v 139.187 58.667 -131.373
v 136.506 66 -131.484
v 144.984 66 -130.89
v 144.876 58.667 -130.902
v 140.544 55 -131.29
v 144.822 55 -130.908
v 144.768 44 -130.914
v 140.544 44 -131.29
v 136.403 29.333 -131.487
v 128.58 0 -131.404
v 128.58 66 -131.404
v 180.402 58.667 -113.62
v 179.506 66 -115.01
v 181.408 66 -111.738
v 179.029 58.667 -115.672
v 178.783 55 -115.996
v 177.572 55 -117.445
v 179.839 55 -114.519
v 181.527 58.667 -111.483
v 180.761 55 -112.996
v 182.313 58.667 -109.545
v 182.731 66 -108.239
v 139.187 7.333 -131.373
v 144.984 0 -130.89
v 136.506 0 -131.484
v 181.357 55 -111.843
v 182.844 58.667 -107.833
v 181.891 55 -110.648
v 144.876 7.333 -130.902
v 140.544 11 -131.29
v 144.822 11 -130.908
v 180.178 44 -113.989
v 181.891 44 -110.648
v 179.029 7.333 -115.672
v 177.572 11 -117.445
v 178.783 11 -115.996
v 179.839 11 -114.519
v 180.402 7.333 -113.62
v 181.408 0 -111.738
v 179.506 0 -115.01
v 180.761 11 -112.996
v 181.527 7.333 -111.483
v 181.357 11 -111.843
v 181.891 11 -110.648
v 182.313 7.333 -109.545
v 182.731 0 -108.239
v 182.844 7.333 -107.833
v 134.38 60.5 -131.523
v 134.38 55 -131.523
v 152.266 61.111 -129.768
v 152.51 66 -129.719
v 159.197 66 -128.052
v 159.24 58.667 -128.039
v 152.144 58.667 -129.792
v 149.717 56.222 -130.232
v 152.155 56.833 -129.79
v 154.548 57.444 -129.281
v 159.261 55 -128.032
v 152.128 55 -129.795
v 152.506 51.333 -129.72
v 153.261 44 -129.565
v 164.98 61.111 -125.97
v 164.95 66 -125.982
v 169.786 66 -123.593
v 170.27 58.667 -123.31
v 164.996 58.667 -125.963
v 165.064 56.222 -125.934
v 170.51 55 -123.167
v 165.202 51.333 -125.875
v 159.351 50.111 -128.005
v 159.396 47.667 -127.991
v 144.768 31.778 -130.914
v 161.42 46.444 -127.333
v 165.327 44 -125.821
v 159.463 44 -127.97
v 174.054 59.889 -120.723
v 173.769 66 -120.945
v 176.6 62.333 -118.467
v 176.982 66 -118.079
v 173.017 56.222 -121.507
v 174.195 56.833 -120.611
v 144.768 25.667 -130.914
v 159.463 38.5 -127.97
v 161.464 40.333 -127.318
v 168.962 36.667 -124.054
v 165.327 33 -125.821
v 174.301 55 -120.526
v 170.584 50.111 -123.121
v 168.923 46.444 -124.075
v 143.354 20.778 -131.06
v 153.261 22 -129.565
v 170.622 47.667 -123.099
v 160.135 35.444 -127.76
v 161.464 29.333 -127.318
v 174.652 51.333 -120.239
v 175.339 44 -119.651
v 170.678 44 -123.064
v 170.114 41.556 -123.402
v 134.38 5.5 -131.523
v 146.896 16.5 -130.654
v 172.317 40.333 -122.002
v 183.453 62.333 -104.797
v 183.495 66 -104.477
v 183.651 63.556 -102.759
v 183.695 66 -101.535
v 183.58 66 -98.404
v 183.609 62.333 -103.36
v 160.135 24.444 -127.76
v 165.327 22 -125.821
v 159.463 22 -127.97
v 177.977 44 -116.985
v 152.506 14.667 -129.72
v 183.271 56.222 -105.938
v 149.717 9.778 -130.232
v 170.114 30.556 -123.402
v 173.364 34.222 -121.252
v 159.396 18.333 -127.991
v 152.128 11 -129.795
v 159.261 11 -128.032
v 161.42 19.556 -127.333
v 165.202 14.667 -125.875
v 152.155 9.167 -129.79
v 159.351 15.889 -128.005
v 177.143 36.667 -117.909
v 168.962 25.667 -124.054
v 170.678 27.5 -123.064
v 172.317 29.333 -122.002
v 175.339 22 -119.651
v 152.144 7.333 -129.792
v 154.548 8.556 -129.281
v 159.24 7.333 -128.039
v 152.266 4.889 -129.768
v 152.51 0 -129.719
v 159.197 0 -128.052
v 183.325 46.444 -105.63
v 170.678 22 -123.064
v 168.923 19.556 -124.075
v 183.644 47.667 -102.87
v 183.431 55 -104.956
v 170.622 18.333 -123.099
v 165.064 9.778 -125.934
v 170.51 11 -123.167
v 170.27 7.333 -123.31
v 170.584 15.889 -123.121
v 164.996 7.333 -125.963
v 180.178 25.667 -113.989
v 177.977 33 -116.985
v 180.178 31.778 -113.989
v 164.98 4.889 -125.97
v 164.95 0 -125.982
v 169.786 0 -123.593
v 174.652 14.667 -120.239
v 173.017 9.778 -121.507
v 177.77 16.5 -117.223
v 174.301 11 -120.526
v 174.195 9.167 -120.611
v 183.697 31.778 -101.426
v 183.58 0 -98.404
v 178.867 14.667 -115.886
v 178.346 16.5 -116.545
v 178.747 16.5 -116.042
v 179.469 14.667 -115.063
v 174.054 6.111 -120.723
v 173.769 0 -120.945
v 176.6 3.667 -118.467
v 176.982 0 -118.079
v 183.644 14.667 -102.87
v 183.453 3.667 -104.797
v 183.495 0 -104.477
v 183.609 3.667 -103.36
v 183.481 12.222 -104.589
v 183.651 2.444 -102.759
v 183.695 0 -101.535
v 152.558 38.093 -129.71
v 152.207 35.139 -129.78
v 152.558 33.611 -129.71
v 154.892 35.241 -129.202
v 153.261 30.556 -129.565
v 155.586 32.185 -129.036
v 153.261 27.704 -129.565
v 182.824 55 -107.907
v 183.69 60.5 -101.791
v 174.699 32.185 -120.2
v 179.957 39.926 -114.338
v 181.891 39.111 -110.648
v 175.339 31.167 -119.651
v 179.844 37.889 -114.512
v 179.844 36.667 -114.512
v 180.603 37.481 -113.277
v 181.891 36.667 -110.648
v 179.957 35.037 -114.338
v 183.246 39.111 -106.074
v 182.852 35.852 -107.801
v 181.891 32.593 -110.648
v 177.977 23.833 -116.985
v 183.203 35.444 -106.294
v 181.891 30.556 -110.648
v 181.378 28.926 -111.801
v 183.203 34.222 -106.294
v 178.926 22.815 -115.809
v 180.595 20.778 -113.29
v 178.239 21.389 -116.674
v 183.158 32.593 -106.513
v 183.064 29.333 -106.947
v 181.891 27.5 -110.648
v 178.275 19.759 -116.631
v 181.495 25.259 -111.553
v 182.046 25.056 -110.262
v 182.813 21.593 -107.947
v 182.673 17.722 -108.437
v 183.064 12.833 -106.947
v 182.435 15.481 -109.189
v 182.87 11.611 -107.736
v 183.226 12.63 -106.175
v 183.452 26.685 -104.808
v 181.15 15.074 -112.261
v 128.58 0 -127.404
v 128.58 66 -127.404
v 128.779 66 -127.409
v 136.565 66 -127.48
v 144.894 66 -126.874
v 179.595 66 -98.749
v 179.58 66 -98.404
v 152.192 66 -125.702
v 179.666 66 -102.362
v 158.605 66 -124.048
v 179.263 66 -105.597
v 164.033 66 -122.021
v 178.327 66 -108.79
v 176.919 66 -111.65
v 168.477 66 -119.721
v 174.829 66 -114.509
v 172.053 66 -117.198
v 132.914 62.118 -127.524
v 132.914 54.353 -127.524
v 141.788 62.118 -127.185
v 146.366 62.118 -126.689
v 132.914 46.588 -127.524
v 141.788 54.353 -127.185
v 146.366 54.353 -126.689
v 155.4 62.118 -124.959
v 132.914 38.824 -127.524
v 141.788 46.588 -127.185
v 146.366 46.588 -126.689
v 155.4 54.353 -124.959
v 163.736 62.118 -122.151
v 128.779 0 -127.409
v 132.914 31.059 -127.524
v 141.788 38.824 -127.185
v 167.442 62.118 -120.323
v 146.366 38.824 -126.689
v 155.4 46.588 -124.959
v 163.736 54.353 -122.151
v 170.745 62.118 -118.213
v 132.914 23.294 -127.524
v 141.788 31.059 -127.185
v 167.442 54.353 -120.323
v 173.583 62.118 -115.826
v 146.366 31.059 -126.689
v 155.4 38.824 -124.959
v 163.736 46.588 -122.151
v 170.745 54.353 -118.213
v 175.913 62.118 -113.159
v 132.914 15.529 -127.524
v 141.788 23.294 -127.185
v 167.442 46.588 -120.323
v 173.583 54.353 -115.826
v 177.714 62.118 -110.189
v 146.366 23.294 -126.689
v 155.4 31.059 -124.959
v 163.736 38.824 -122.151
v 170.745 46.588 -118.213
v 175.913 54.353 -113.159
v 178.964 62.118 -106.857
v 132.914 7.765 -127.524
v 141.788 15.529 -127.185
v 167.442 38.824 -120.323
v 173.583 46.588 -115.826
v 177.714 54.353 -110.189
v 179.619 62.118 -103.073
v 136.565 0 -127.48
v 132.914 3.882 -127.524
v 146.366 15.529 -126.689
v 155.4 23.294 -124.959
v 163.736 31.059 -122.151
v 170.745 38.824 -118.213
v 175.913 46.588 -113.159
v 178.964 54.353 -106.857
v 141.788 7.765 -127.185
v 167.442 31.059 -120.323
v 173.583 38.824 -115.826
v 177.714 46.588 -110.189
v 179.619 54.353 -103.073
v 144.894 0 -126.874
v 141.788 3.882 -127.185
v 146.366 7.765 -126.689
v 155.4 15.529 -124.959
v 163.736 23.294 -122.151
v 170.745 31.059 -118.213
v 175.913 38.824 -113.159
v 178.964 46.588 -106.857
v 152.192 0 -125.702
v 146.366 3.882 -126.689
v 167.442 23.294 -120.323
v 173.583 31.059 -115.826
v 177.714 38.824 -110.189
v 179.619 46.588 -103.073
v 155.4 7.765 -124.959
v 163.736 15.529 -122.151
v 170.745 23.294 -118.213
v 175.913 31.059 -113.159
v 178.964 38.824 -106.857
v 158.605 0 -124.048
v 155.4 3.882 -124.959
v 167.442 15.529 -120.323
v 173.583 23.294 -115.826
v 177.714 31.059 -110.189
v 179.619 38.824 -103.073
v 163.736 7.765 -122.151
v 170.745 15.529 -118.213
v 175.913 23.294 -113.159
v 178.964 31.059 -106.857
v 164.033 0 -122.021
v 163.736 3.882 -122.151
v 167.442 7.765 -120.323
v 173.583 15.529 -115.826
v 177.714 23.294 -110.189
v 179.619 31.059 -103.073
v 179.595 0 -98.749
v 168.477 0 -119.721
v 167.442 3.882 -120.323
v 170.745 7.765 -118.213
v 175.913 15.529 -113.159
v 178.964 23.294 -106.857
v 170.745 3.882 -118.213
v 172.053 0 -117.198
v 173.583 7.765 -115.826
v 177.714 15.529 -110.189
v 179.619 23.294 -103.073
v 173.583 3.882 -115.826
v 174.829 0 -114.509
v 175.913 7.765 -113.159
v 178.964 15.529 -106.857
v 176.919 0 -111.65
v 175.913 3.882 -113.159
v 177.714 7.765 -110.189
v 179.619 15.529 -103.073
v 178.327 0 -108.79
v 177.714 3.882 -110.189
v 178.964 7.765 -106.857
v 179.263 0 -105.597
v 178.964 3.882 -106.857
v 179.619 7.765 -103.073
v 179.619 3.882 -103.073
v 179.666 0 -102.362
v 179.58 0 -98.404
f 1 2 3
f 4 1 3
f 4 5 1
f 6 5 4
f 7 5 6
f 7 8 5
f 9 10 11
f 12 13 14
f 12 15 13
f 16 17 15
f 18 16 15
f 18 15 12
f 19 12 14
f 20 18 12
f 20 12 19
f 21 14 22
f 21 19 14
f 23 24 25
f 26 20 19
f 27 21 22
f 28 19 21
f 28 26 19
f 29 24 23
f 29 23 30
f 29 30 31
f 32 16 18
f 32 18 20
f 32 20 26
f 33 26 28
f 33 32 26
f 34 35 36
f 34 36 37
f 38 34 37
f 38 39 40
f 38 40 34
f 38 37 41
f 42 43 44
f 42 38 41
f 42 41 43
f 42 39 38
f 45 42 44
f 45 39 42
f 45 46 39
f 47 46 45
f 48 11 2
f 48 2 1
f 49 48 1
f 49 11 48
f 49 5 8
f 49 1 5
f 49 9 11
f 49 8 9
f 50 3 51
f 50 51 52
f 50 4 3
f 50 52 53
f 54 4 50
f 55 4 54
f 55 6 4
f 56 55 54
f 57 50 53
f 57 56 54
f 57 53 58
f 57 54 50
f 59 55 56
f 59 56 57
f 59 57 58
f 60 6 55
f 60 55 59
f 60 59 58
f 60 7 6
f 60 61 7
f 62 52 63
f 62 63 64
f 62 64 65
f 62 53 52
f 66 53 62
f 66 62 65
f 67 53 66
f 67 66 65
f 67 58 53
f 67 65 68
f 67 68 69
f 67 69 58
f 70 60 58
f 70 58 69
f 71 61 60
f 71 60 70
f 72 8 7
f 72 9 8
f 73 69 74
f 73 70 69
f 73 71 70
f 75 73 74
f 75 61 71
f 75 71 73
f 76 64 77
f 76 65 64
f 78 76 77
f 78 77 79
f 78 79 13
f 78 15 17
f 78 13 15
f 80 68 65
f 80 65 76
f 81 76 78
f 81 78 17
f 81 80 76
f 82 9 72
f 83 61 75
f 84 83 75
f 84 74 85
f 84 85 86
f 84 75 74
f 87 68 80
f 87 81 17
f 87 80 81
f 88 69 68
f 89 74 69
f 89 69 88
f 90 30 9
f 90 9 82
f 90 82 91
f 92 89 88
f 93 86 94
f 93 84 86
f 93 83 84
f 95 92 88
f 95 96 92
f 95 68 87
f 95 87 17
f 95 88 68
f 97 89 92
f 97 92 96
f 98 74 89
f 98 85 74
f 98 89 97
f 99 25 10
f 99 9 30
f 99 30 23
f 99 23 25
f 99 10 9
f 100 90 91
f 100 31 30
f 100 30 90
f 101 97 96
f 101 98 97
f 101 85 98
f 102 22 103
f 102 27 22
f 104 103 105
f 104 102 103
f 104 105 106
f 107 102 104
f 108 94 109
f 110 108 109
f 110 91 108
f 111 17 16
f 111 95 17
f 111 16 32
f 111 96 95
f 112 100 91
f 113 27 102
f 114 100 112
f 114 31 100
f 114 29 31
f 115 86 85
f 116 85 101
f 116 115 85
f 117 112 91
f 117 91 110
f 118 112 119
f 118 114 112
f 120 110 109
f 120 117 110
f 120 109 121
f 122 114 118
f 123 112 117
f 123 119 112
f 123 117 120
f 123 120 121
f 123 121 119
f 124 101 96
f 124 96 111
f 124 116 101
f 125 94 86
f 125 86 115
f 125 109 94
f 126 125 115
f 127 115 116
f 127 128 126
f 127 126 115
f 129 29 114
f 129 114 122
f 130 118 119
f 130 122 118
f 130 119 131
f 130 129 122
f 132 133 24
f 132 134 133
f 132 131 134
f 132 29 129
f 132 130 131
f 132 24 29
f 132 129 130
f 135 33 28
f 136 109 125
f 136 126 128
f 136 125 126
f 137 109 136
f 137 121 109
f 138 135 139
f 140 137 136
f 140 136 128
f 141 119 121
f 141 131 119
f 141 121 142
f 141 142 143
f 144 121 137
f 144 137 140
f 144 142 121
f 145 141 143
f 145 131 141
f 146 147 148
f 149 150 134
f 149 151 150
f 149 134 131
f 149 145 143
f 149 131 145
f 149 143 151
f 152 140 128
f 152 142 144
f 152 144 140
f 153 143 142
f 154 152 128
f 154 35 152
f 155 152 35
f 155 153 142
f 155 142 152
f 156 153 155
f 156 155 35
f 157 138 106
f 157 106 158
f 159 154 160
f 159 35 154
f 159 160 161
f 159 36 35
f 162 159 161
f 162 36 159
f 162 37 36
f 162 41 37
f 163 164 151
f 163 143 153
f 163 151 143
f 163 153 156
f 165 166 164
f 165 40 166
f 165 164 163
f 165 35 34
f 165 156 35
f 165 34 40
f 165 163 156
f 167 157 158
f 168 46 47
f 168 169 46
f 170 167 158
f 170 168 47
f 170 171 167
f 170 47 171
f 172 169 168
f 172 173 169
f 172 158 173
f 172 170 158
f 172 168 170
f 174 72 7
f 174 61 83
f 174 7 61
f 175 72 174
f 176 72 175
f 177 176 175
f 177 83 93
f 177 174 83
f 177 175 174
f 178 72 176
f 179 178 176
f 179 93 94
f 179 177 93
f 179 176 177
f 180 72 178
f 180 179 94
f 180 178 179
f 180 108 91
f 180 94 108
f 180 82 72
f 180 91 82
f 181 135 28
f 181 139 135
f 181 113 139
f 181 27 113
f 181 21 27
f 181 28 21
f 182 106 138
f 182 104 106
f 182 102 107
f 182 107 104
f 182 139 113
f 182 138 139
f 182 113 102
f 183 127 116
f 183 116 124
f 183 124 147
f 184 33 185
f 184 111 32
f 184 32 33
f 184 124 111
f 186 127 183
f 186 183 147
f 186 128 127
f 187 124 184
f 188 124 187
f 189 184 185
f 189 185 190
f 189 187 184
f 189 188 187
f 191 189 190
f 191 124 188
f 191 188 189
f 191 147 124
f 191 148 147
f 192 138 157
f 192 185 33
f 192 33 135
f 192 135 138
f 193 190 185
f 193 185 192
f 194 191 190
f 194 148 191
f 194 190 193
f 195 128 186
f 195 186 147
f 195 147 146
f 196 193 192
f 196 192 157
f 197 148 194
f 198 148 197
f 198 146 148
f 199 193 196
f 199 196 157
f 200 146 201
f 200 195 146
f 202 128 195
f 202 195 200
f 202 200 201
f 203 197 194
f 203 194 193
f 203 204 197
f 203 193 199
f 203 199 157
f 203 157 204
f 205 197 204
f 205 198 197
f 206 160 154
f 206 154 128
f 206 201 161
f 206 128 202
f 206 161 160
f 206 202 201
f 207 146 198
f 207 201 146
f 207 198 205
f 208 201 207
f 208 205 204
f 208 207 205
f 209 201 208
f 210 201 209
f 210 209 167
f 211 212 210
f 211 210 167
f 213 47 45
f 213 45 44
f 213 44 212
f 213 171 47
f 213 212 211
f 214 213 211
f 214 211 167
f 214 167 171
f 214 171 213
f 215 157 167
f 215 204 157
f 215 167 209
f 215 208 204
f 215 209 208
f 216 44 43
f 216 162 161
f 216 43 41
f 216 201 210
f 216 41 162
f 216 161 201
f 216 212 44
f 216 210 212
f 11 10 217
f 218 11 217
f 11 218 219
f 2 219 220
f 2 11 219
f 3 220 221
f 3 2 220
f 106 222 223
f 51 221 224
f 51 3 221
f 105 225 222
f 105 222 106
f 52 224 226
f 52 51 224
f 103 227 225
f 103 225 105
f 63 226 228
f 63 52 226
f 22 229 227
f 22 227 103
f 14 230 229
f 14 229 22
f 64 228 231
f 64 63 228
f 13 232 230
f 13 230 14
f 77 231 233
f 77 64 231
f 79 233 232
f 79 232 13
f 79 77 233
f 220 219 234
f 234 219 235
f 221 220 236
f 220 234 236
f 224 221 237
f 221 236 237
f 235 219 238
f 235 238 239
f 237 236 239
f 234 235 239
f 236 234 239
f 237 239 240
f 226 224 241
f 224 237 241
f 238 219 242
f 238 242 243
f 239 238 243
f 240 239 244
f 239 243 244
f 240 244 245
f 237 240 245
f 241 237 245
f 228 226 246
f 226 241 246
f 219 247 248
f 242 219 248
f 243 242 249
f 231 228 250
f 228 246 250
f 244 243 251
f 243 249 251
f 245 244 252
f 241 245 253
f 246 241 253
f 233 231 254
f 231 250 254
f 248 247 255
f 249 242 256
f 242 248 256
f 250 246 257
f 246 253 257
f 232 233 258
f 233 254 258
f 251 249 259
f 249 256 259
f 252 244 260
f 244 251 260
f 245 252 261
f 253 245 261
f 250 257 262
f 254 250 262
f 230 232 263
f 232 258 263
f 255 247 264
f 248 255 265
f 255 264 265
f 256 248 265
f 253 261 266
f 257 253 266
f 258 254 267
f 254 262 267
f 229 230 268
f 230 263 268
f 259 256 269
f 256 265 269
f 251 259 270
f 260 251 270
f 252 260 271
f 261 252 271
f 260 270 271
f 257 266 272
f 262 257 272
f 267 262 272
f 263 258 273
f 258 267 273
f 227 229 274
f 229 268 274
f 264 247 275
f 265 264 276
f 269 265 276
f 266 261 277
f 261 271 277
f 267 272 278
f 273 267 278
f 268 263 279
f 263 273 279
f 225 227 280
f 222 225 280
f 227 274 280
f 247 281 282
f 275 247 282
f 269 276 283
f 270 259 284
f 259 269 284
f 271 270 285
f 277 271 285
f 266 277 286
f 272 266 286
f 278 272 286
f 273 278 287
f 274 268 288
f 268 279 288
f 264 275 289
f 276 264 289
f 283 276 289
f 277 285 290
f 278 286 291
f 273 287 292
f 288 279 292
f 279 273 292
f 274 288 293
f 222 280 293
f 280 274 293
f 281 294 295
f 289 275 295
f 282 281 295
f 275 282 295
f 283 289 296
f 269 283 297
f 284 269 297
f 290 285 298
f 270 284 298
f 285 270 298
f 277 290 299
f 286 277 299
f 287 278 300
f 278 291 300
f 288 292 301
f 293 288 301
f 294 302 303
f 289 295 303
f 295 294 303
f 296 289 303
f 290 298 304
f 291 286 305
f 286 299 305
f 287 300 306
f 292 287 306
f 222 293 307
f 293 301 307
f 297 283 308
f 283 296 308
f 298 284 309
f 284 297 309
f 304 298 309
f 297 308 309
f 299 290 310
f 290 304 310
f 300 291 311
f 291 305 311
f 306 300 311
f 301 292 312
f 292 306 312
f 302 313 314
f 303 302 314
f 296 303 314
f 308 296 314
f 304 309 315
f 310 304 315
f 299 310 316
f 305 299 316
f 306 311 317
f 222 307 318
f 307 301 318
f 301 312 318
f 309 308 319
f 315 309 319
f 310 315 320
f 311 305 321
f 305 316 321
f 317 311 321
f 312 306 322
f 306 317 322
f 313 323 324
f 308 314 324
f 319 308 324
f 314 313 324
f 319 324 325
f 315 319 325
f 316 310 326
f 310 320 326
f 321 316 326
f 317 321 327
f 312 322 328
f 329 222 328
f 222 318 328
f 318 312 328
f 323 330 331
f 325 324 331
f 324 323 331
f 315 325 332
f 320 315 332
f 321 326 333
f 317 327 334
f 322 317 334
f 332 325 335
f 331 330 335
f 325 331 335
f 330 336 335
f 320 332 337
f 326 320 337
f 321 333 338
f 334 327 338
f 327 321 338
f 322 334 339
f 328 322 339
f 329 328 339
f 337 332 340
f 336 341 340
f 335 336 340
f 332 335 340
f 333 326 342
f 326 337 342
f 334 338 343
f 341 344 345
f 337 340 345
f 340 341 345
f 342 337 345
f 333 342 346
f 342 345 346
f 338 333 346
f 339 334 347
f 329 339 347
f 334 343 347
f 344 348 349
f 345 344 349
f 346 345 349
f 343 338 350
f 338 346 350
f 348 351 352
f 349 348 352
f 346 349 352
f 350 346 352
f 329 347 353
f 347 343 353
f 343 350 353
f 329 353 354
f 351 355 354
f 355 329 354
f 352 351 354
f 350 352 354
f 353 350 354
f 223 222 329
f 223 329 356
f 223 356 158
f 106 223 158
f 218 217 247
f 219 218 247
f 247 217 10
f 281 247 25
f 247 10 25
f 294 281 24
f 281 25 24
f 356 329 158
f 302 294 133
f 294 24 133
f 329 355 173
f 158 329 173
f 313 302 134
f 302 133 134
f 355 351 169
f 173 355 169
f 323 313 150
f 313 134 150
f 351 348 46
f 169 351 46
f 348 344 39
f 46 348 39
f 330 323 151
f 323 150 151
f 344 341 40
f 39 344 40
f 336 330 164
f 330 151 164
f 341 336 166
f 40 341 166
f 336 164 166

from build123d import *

# Parameters (mm, degrees)
BOSS_EXTRUDE1_DEPTH = 66


with BuildPart() as part:
    # Sketch1 → Boss-Extrude1 (new body)
    with BuildSketch(Plane(origin=(0, 0, 0), x_dir=(1, 0, 0), z_dir=(0, 1, 0))):
        with BuildLine():
            Line((179.594560701, 98.74876777), (179.579673978, 98.403989326))
            Line((179.579673978, 98.403989326), (183.579673978, 98.403989326))
            add(Edge.make_bspline(
                [(128.579673978, 131.403989326), (150.817891371, 132.515318451), (186.002119087, 126.40376225), (183.579673978, 98.403989326)],
                knots=[0, 0, 0, 0, 1, 1, 1, 1], degree=3))
            Line((128.579673978, 131.403989326), (128.579673978, 127.403989326))
            Line((128.579673978, 127.403989326), (128.779320198, 127.408974759))
            add(Edge.make_bspline(
                [(128.779320198, 127.408974759), (129.456925245, 127.442837285), (130.796469522, 127.49505496), (133.608856634, 127.544195588), (137.251969936, 127.49028904), (141.777282014, 127.221776911), (147.898035457, 126.565632752), (155.516447723, 125.140481347), (163.959933839, 122.341583271), (169.876032605, 119.055757918), (173.667431344, 115.871614333), (176.001562959, 113.207973184), (177.804863705, 110.248156926), (178.852838991, 107.484701632), (179.396589336, 105.04819852), (179.647182857, 103.096696056), (179.714900135, 101.353981419), (179.678303178, 99.894033889), (179.627270776, 99.126846368), (179.594560701, 98.74876777)],
                knots=[0, 0, 0, 0, 0.03125, 0.0625, 0.125, 0.1875, 0.25, 0.375, 0.5, 0.625, 0.6875, 0.75, 0.8125, 0.875, 0.90625, 0.9375, 0.96875, 0.984375, 1, 1, 1, 1], degree=3))
        make_face()
    extrude(amount=BOSS_EXTRUDE1_DEPTH)


solid = part.part
